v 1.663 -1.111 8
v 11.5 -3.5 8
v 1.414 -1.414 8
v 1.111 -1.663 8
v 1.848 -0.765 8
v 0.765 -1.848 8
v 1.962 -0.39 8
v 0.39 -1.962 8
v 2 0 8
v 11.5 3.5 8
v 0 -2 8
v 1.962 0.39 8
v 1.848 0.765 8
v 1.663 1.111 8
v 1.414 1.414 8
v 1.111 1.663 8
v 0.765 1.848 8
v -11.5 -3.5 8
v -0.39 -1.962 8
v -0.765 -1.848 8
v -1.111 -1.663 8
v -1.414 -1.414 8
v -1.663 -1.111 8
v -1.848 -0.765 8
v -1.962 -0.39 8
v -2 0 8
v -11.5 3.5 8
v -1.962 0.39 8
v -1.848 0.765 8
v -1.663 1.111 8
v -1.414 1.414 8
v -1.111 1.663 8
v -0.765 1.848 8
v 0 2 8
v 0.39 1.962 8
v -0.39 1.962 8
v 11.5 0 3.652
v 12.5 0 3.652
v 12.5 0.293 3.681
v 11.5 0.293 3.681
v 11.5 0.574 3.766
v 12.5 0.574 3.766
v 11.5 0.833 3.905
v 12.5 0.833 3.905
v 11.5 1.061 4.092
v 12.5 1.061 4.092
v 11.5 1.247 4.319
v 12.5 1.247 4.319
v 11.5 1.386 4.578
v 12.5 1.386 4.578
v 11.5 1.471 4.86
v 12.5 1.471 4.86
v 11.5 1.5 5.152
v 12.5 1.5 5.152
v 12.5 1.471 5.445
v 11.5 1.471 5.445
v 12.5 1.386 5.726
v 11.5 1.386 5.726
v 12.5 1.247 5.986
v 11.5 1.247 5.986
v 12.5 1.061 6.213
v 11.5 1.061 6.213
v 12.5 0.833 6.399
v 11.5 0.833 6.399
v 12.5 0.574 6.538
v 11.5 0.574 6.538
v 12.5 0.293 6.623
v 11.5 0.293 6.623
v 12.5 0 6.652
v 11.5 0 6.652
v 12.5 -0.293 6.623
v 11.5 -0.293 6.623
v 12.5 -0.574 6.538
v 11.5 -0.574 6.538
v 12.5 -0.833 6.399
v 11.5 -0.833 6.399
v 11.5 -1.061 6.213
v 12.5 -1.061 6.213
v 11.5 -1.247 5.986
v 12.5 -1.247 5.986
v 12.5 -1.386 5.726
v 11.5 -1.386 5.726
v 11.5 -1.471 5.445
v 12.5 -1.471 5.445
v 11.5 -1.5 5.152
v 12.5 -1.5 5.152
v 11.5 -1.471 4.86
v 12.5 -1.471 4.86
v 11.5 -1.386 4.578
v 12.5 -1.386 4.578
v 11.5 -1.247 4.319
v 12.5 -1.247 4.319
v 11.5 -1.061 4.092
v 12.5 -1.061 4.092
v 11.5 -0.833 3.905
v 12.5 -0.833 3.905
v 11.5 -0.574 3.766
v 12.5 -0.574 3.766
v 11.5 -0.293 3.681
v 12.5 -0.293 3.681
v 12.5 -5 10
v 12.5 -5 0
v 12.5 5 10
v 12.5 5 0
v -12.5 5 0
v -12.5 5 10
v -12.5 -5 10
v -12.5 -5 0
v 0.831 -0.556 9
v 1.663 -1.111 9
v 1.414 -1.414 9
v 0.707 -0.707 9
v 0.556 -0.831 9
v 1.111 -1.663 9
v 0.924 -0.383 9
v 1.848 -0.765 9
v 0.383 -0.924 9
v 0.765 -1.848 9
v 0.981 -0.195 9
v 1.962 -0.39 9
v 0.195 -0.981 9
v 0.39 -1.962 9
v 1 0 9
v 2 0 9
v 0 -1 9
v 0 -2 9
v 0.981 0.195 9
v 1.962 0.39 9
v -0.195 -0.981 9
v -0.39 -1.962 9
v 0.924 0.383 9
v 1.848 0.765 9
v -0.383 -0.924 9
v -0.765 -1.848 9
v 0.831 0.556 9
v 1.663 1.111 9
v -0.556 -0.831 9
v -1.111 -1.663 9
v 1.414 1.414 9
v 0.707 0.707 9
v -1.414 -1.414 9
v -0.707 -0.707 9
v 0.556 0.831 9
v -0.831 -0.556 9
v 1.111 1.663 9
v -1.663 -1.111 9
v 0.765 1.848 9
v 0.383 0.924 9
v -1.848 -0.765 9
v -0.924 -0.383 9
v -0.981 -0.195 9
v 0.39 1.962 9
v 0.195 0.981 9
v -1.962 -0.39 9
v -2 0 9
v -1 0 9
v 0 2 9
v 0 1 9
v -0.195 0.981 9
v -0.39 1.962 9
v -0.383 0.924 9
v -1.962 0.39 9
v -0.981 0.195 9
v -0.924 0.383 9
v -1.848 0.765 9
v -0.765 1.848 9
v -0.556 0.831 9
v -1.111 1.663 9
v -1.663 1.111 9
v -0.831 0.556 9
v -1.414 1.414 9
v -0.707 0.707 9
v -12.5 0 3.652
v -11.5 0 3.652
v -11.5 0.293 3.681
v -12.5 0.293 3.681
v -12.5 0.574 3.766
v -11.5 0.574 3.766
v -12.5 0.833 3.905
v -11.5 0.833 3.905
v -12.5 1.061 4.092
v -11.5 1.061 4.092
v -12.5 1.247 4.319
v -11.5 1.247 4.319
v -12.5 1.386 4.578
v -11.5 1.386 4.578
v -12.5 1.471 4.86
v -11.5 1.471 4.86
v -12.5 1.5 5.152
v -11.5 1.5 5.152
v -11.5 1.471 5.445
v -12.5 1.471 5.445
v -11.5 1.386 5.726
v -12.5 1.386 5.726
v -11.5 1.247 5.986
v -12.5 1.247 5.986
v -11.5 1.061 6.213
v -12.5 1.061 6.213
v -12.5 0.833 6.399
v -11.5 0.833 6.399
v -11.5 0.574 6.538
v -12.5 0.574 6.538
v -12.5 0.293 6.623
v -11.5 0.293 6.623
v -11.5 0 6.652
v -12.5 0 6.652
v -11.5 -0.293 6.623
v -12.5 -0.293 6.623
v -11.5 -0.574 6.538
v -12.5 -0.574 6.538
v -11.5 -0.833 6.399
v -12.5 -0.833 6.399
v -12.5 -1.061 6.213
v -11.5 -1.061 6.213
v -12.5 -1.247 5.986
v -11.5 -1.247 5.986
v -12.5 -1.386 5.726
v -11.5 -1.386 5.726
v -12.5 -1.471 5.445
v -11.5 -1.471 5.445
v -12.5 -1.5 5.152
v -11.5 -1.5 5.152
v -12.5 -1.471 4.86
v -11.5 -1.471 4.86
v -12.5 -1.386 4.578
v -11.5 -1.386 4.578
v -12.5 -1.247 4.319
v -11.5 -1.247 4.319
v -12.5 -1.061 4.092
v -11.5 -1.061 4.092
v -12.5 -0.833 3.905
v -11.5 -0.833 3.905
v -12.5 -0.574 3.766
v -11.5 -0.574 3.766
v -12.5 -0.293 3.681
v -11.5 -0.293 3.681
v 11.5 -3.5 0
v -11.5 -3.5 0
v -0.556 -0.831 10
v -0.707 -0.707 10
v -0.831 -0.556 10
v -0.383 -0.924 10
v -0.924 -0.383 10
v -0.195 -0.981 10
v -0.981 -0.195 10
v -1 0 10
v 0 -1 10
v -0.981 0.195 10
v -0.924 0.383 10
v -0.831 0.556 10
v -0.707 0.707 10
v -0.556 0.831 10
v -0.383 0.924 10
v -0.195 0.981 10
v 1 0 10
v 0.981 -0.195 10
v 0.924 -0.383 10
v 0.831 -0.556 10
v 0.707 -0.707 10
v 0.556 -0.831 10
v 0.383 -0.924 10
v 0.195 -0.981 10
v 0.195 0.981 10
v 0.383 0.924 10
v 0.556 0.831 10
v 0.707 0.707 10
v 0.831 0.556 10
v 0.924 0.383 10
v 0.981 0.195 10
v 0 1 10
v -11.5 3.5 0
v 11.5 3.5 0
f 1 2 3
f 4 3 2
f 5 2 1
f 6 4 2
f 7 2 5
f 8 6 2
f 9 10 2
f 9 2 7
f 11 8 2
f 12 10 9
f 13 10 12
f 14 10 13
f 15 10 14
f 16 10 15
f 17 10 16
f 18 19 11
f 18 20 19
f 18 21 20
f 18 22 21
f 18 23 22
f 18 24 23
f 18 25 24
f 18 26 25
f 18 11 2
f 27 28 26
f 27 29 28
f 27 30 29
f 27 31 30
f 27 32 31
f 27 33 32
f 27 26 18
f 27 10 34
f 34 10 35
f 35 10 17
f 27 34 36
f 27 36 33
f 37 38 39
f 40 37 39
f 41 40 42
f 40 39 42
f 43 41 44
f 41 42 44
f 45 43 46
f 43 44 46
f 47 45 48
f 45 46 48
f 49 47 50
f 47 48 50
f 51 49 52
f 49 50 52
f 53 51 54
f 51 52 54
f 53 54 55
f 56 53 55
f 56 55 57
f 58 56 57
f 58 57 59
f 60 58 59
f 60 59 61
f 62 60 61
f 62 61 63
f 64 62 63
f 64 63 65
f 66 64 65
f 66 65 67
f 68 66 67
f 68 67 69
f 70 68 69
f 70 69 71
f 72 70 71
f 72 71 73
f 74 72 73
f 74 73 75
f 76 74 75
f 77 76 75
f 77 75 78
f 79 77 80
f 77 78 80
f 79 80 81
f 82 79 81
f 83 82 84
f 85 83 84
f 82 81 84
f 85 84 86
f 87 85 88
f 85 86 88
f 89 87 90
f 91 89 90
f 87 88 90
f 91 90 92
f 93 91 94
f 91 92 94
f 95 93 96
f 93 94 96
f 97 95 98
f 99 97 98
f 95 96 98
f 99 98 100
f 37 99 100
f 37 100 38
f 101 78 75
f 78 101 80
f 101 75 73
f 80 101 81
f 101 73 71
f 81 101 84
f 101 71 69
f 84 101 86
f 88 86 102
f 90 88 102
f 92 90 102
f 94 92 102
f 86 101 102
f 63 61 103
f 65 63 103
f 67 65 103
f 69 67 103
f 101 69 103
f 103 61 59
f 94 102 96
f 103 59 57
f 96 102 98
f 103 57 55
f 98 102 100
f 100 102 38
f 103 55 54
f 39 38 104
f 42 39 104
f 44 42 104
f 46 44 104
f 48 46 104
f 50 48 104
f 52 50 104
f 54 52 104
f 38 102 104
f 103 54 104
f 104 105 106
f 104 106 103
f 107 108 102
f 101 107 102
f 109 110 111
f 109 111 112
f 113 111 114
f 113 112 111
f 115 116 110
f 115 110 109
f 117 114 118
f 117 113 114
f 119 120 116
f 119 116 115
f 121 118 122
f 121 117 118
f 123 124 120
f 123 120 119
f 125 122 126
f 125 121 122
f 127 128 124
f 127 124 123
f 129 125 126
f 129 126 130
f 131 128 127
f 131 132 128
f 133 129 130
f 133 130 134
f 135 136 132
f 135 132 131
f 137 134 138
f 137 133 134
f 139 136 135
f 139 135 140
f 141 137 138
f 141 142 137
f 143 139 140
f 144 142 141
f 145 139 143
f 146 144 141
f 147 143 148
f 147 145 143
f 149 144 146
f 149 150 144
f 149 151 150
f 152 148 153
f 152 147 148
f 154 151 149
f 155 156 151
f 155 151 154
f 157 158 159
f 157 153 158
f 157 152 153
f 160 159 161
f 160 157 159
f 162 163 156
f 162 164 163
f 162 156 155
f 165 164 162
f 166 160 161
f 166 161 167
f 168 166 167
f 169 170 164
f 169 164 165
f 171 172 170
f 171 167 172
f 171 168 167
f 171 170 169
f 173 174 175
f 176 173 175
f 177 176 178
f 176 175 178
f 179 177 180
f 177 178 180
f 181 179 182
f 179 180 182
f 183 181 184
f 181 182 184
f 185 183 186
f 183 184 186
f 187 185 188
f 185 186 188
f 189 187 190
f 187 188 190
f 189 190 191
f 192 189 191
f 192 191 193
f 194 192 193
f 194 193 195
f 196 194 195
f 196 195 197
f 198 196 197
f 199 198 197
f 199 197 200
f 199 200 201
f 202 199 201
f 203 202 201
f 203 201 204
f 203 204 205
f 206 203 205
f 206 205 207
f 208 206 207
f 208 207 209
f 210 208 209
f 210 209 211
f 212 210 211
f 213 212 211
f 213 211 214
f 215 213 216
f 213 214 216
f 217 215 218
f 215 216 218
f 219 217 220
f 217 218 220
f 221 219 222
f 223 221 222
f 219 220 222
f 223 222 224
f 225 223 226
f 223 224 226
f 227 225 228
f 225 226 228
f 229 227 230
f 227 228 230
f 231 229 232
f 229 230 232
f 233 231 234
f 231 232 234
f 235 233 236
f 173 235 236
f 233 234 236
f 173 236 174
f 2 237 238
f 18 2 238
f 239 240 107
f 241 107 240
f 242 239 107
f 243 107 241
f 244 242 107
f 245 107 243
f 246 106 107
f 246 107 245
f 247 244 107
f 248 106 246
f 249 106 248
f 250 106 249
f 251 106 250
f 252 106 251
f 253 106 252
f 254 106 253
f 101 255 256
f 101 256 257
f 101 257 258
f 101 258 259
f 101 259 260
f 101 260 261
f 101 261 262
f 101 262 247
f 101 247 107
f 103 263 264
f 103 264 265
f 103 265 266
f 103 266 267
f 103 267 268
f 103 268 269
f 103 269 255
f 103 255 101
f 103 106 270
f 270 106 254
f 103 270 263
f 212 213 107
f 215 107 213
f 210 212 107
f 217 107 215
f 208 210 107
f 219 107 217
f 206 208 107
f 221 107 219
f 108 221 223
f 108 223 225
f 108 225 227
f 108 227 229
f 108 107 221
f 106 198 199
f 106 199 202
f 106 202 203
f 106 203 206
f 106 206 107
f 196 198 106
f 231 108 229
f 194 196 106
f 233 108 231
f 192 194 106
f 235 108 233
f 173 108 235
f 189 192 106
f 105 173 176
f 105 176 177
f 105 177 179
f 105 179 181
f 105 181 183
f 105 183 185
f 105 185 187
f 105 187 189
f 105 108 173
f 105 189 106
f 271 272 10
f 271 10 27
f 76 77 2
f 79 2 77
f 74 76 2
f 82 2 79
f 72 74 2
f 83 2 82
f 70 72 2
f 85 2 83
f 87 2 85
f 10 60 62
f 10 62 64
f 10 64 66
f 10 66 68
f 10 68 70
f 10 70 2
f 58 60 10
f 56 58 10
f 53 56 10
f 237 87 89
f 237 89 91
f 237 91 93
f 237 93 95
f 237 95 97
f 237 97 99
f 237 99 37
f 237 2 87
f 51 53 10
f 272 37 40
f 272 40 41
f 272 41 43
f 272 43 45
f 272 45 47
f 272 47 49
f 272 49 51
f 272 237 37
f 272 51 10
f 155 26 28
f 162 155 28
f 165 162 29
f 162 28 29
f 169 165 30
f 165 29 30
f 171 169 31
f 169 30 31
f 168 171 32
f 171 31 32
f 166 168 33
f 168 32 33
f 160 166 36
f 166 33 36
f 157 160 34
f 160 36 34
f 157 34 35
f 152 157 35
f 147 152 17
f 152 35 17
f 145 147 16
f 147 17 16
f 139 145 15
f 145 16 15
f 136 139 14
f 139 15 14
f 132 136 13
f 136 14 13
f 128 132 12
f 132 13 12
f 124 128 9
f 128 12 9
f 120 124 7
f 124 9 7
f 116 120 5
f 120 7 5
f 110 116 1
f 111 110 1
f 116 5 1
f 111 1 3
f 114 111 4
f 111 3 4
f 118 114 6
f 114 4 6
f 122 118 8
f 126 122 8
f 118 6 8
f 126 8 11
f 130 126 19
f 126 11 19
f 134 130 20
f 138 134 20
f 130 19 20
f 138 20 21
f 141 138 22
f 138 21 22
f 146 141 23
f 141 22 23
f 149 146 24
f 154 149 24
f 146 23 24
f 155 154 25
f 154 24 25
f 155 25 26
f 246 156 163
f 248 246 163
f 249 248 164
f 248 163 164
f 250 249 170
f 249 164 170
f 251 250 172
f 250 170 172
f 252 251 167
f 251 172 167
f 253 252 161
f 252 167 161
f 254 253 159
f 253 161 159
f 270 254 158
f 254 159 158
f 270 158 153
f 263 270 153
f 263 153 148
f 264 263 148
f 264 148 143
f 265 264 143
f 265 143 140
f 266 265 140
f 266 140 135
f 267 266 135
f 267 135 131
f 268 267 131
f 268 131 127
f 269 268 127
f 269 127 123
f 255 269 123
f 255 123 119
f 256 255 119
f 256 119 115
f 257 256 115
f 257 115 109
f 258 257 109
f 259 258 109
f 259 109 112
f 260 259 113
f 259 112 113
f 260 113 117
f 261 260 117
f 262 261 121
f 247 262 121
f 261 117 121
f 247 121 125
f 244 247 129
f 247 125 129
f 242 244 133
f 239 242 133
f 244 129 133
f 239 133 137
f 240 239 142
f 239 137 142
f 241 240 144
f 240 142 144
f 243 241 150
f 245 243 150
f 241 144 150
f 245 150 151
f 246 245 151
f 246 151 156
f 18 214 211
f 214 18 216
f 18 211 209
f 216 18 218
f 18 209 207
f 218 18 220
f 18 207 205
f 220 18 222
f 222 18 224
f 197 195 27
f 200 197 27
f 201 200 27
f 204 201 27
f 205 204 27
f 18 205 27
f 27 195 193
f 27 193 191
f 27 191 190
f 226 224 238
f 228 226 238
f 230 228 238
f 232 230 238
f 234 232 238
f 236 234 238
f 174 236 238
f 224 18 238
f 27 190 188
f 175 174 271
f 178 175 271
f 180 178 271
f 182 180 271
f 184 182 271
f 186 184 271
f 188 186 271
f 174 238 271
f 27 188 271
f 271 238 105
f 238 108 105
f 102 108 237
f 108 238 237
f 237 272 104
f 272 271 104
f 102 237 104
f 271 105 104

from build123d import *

# Parameters (mm, degrees)
SKETCH1_W           = 25
SKETCH1_H           = 10
BOSS_EXTRUDE1_DEPTH = 10
SKETCH2_W           = 23
SKETCH2_H           = 7
CUT_EXTRUDE1_DEPTH  = 8
SKETCH3_R           = 1.5
CUT_EXTRUDE2_DEPTH  = 51
SKETCH4_R           = 2
CUT_EXTRUDE3_DEPTH  = 1
SKETCH5_R           = 1
CUT_EXTRUDE4_DEPTH  = 4


with BuildPart() as part:
    # Sketch1 → Boss-Extrude1 (new body)
    with BuildSketch(Plane.XY):
        Rectangle(SKETCH1_W, SKETCH1_H)
    extrude(amount=BOSS_EXTRUDE1_DEPTH)

    # Sketch2 → Cut-Extrude1 (cut)
    with BuildSketch(Plane(origin=(0, 0, 0), x_dir=(-1, 0, 0), z_dir=(0, 0, -1))):
        Rectangle(SKETCH2_W, SKETCH2_H)
    extrude(amount=-CUT_EXTRUDE1_DEPTH, mode=Mode.SUBTRACT)

    # Sketch3 → Cut-Extrude2 (cut)
    with BuildSketch(Plane(origin=(12.5, 0, 0), x_dir=(0, 0, -1), z_dir=(1, 0, 0))):
        with Locations((-5.152207195, 0)):
            Circle(SKETCH3_R)
    extrude(amount=-CUT_EXTRUDE2_DEPTH, mode=Mode.SUBTRACT)

    # Sketch4 → Cut-Extrude3 (cut)
    with BuildSketch(Plane(origin=(0, 0, 8), x_dir=(-1, 0, 0), z_dir=(0, 0, -1))):
        Circle(SKETCH4_R)
    extrude(amount=-CUT_EXTRUDE3_DEPTH, mode=Mode.SUBTRACT)

    # Sketch5 → Cut-Extrude4 (cut)
    with BuildSketch(Plane(origin=(0, 0, 9), x_dir=(-1, 0, 0), z_dir=(0, 0, -1))):
        Circle(SKETCH5_R)
    extrude(amount=-CUT_EXTRUDE4_DEPTH, mode=Mode.SUBTRACT)


solid = part.part
